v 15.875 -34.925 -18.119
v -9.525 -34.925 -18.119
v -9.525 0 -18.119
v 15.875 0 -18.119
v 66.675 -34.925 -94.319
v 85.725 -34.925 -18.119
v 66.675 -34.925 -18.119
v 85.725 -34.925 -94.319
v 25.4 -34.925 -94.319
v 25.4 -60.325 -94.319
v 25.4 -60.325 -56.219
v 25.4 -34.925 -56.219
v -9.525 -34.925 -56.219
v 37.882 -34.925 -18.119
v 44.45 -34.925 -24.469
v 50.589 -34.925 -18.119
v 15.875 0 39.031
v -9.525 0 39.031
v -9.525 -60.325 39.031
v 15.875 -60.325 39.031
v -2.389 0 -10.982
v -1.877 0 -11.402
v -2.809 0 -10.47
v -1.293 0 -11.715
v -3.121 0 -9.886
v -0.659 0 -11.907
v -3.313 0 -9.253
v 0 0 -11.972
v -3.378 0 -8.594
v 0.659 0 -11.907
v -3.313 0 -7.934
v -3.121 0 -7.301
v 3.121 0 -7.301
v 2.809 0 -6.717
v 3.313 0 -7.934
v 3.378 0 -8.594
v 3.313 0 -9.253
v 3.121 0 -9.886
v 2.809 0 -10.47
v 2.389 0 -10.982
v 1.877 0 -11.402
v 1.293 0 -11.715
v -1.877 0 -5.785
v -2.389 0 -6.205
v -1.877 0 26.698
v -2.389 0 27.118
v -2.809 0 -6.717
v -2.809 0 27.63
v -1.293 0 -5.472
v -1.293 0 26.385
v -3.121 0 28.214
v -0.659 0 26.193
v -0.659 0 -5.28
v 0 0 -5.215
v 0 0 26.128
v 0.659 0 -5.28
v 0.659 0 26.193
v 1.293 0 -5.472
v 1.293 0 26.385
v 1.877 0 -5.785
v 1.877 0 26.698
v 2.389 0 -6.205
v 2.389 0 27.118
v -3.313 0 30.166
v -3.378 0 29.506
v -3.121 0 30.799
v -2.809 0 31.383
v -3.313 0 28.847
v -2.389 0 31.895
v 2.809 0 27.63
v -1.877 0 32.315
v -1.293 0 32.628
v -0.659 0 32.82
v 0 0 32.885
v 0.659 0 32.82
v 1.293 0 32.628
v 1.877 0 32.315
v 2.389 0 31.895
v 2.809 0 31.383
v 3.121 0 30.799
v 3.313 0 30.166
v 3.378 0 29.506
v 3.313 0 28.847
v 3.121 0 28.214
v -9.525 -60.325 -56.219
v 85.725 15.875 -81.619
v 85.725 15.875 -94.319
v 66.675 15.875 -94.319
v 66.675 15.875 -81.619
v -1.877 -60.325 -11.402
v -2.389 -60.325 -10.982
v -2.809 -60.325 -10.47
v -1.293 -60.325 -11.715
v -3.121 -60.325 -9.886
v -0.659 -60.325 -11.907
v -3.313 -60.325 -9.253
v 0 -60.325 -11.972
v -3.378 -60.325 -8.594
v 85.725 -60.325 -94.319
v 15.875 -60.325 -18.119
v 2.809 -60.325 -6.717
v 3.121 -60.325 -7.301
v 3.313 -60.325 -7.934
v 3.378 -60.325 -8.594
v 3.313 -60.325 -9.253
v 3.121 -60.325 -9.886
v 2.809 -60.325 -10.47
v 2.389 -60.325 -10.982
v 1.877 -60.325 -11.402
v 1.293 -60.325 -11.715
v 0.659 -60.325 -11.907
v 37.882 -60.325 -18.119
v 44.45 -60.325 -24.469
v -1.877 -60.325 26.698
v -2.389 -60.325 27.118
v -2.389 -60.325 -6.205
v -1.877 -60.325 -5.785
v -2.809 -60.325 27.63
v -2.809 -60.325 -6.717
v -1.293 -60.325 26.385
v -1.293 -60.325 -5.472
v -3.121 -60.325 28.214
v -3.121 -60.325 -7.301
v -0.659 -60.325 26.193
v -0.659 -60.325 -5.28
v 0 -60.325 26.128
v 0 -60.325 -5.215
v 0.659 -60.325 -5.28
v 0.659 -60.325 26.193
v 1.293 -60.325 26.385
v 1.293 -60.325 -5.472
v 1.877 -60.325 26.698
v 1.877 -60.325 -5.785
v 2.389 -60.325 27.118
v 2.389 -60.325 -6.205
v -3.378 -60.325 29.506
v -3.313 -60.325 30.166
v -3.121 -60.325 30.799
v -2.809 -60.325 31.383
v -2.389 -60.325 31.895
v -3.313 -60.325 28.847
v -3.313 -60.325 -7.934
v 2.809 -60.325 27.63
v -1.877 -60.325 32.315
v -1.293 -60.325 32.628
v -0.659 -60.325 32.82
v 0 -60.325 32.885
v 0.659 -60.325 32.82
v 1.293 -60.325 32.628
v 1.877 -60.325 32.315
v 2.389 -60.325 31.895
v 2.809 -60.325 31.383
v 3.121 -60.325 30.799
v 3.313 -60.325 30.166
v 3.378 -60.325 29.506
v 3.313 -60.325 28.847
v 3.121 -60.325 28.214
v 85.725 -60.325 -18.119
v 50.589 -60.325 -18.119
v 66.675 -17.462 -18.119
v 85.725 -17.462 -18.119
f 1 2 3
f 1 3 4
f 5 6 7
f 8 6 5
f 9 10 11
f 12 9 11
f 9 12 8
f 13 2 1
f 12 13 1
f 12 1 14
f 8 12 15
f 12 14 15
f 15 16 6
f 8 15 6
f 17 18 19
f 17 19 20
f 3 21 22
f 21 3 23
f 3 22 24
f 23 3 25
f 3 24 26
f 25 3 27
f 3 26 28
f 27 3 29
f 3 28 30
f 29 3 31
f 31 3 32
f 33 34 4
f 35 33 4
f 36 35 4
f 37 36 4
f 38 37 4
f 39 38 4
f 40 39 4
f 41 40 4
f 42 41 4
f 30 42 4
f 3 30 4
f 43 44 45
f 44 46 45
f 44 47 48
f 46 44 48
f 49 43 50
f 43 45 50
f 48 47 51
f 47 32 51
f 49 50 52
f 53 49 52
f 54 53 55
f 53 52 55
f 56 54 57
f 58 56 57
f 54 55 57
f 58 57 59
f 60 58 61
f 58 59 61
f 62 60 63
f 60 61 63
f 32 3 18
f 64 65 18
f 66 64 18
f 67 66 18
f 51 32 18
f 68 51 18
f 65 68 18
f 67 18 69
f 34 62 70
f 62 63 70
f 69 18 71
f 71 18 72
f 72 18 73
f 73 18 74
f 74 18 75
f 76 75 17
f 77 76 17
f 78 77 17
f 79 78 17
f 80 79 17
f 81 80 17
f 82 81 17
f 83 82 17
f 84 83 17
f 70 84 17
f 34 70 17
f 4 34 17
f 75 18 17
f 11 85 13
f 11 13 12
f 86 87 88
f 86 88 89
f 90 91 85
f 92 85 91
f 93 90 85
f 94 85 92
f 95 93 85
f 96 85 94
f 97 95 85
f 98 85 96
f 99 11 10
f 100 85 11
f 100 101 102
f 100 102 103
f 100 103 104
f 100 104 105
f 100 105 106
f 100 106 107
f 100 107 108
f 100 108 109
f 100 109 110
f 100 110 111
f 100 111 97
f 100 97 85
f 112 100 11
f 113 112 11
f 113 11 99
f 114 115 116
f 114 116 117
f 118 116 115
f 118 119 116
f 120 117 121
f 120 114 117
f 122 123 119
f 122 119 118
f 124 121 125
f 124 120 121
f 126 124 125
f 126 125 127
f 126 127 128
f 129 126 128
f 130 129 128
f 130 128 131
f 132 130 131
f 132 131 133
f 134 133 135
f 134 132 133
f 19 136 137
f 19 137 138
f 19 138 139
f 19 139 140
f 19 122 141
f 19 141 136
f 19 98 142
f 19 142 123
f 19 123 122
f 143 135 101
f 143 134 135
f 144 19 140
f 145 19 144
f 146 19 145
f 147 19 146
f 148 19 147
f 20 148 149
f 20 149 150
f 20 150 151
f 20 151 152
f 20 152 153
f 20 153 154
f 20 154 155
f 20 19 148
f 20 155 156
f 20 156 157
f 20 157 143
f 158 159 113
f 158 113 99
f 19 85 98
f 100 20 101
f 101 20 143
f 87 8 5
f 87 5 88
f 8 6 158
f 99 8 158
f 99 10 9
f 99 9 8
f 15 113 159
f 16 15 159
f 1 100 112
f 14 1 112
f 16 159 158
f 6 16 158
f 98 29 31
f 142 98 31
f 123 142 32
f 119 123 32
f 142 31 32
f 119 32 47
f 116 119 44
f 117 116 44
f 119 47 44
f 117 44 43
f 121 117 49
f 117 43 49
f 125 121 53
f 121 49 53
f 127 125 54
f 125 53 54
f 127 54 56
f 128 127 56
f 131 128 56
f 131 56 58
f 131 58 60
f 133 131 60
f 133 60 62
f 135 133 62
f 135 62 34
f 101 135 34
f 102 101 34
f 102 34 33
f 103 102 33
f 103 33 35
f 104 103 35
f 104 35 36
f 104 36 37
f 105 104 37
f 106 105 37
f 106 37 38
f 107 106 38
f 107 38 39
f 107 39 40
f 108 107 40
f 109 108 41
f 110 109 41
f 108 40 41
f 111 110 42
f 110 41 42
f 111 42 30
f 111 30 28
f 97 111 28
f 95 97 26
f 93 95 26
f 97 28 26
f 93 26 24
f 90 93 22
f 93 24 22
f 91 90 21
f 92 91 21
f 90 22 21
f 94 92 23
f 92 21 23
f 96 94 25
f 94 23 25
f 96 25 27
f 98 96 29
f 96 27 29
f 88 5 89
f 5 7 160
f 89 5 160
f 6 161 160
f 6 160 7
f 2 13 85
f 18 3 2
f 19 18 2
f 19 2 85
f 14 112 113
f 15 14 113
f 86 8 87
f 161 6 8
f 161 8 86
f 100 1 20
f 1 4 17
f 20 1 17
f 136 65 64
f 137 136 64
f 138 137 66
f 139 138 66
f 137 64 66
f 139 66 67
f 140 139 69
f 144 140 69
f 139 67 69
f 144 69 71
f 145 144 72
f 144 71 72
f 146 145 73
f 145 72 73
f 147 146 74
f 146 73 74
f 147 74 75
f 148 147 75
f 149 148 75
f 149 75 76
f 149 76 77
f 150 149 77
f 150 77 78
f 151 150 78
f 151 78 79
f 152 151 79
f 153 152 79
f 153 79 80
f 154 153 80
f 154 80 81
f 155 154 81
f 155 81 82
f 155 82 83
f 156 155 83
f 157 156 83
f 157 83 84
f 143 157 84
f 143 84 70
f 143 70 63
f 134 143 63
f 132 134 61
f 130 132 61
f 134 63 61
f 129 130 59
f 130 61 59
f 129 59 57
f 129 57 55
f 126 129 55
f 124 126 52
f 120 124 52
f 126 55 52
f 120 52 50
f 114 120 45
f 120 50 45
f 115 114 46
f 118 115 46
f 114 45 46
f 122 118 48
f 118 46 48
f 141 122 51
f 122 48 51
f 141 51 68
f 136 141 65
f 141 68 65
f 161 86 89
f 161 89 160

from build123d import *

# Parameters (mm, degrees)
F0_W      = 25.4
F0_H      = 57.15
F1_DEPTH  = 60.325
F3_D      = 6.7564
F5_D      = 6.7564
F6_W      = 95.25
F6_H      = 25.4
F7_DEPTH  = 76.2
F8_W      = 34.925
F8_H      = 38.1
F9_DEPTH  = 50.8
F11_DEPTH = 50.8
F13_DEPTH = 19.05


with BuildPart() as f1:
    # F0 (on Front) → F1 (new body)
    with BuildSketch(Plane.XZ):
        with Locations((3.175, 10.4564832059)):
            Rectangle(F0_W, F0_H)
    extrude(amount=F1_DEPTH)

    # F3 (through all)
    with Locations(Plane.XZ.offset(60.325)):
        with Locations((0, 29.5064832059)):
            Hole(F3_D / 2)

    # F5 (through all)
    with Locations(Plane.XZ.offset(60.325)):
        with Locations((0, -8.5935167941)):
            Hole(F5_D / 2)

    # F6 (on face) → F7 (join)
    with BuildSketch(Plane(origin=(0, 0, -18.1185167941), x_dir=(1, 0, 0), z_dir=(0, 0, -1))):
        with Locations((38.1, 47.625)):
            Rectangle(F6_W, F6_H)
    extrude(amount=F7_DEPTH)

    # F8 (on face) → F9 (cut)
    with BuildSketch(Plane.XZ.offset(60.325)):
        with Locations((7.9375, -75.2685167941)):
            Rectangle(F8_W, F8_H)
    extrude(amount=-F9_DEPTH, mode=Mode.SUBTRACT)

    # F10 (on face) → F11 (cut)
    with BuildSketch(Plane.XZ.offset(60.325)):
        Polygon((57.1193047827, -11.3636797151), (29.0353151171, -9.5661307718), (44.45, -24.4685167941), align=None)
    extrude(amount=-F11_DEPTH, mode=Mode.SUBTRACT)


with BuildPart() as f13:
    # F12 (on face) → F13 (new body)
    with BuildSketch(Plane.YZ.offset(85.725)):
        Polygon((-17.4625, -18.1185167941), (-34.925, -18.1185167941), (-34.925, -94.3185167941), (15.875, -94.3185167941), (15.875, -81.6185167941), align=None)
    extrude(amount=-F13_DEPTH)


solid = Compound([f1.part, f13.part])
